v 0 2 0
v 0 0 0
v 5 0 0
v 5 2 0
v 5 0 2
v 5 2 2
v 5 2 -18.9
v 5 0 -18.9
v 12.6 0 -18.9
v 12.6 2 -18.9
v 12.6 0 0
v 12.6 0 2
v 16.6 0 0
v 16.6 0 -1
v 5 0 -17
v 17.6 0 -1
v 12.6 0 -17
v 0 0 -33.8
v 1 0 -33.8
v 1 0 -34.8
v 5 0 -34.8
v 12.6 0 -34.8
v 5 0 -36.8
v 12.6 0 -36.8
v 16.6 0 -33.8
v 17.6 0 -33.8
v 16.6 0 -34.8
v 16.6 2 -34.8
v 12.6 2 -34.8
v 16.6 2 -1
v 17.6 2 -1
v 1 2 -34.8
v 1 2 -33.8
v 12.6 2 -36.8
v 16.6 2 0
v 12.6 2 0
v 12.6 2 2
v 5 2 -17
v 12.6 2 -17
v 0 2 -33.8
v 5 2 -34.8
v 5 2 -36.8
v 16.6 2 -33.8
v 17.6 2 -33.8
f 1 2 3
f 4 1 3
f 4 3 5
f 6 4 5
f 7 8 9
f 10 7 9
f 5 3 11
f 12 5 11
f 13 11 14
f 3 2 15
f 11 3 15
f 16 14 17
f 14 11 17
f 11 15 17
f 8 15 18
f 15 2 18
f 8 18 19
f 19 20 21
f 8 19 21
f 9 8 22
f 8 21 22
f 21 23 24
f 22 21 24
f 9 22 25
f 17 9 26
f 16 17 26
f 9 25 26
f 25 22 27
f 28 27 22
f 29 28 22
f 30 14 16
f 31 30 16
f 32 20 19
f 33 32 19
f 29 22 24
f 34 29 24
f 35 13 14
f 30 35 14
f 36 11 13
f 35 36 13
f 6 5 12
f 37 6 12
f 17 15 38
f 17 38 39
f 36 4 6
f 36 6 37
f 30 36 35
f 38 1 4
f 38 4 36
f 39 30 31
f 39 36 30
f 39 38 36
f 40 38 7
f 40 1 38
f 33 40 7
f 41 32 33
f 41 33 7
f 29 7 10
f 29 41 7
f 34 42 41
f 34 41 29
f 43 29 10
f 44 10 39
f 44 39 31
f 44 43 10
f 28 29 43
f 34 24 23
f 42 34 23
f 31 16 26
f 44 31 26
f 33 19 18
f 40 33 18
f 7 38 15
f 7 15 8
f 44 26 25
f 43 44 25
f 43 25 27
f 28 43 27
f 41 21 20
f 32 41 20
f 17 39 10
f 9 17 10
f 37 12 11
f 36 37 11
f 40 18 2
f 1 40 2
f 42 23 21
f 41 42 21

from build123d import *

# Parameters (mm, degrees)
SKETCH_1_W      = 7.6
SKETCH_1_H      = 1.9
EXTRUDE_1_DEPTH = 2


with BuildPart() as part:
    # 草图1 → 凸台-拉伸1 (new body)
    with BuildSketch(Plane(origin=(0, 0, 0), x_dir=(1, 0, 0), z_dir=(0, 1, 0))):
        Polygon((0, 33.8), (0, 0), (5, 0), (5, -2), (12.6, -2), (12.6, 0), (16.6, 0), (16.6, 1), (17.6, 1), (17.6, 33.8), (16.6, 33.8), (16.6, 34.8), (12.6, 34.8), (12.6, 36.8), (5, 36.8), (5, 34.8), (1, 34.8), (1, 33.8), align=None)
        with Locations((8.8, 17.95)):
            Rectangle(SKETCH_1_W, SKETCH_1_H, mode=Mode.SUBTRACT)
    extrude(amount=EXTRUDE_1_DEPTH)


solid = part.part
